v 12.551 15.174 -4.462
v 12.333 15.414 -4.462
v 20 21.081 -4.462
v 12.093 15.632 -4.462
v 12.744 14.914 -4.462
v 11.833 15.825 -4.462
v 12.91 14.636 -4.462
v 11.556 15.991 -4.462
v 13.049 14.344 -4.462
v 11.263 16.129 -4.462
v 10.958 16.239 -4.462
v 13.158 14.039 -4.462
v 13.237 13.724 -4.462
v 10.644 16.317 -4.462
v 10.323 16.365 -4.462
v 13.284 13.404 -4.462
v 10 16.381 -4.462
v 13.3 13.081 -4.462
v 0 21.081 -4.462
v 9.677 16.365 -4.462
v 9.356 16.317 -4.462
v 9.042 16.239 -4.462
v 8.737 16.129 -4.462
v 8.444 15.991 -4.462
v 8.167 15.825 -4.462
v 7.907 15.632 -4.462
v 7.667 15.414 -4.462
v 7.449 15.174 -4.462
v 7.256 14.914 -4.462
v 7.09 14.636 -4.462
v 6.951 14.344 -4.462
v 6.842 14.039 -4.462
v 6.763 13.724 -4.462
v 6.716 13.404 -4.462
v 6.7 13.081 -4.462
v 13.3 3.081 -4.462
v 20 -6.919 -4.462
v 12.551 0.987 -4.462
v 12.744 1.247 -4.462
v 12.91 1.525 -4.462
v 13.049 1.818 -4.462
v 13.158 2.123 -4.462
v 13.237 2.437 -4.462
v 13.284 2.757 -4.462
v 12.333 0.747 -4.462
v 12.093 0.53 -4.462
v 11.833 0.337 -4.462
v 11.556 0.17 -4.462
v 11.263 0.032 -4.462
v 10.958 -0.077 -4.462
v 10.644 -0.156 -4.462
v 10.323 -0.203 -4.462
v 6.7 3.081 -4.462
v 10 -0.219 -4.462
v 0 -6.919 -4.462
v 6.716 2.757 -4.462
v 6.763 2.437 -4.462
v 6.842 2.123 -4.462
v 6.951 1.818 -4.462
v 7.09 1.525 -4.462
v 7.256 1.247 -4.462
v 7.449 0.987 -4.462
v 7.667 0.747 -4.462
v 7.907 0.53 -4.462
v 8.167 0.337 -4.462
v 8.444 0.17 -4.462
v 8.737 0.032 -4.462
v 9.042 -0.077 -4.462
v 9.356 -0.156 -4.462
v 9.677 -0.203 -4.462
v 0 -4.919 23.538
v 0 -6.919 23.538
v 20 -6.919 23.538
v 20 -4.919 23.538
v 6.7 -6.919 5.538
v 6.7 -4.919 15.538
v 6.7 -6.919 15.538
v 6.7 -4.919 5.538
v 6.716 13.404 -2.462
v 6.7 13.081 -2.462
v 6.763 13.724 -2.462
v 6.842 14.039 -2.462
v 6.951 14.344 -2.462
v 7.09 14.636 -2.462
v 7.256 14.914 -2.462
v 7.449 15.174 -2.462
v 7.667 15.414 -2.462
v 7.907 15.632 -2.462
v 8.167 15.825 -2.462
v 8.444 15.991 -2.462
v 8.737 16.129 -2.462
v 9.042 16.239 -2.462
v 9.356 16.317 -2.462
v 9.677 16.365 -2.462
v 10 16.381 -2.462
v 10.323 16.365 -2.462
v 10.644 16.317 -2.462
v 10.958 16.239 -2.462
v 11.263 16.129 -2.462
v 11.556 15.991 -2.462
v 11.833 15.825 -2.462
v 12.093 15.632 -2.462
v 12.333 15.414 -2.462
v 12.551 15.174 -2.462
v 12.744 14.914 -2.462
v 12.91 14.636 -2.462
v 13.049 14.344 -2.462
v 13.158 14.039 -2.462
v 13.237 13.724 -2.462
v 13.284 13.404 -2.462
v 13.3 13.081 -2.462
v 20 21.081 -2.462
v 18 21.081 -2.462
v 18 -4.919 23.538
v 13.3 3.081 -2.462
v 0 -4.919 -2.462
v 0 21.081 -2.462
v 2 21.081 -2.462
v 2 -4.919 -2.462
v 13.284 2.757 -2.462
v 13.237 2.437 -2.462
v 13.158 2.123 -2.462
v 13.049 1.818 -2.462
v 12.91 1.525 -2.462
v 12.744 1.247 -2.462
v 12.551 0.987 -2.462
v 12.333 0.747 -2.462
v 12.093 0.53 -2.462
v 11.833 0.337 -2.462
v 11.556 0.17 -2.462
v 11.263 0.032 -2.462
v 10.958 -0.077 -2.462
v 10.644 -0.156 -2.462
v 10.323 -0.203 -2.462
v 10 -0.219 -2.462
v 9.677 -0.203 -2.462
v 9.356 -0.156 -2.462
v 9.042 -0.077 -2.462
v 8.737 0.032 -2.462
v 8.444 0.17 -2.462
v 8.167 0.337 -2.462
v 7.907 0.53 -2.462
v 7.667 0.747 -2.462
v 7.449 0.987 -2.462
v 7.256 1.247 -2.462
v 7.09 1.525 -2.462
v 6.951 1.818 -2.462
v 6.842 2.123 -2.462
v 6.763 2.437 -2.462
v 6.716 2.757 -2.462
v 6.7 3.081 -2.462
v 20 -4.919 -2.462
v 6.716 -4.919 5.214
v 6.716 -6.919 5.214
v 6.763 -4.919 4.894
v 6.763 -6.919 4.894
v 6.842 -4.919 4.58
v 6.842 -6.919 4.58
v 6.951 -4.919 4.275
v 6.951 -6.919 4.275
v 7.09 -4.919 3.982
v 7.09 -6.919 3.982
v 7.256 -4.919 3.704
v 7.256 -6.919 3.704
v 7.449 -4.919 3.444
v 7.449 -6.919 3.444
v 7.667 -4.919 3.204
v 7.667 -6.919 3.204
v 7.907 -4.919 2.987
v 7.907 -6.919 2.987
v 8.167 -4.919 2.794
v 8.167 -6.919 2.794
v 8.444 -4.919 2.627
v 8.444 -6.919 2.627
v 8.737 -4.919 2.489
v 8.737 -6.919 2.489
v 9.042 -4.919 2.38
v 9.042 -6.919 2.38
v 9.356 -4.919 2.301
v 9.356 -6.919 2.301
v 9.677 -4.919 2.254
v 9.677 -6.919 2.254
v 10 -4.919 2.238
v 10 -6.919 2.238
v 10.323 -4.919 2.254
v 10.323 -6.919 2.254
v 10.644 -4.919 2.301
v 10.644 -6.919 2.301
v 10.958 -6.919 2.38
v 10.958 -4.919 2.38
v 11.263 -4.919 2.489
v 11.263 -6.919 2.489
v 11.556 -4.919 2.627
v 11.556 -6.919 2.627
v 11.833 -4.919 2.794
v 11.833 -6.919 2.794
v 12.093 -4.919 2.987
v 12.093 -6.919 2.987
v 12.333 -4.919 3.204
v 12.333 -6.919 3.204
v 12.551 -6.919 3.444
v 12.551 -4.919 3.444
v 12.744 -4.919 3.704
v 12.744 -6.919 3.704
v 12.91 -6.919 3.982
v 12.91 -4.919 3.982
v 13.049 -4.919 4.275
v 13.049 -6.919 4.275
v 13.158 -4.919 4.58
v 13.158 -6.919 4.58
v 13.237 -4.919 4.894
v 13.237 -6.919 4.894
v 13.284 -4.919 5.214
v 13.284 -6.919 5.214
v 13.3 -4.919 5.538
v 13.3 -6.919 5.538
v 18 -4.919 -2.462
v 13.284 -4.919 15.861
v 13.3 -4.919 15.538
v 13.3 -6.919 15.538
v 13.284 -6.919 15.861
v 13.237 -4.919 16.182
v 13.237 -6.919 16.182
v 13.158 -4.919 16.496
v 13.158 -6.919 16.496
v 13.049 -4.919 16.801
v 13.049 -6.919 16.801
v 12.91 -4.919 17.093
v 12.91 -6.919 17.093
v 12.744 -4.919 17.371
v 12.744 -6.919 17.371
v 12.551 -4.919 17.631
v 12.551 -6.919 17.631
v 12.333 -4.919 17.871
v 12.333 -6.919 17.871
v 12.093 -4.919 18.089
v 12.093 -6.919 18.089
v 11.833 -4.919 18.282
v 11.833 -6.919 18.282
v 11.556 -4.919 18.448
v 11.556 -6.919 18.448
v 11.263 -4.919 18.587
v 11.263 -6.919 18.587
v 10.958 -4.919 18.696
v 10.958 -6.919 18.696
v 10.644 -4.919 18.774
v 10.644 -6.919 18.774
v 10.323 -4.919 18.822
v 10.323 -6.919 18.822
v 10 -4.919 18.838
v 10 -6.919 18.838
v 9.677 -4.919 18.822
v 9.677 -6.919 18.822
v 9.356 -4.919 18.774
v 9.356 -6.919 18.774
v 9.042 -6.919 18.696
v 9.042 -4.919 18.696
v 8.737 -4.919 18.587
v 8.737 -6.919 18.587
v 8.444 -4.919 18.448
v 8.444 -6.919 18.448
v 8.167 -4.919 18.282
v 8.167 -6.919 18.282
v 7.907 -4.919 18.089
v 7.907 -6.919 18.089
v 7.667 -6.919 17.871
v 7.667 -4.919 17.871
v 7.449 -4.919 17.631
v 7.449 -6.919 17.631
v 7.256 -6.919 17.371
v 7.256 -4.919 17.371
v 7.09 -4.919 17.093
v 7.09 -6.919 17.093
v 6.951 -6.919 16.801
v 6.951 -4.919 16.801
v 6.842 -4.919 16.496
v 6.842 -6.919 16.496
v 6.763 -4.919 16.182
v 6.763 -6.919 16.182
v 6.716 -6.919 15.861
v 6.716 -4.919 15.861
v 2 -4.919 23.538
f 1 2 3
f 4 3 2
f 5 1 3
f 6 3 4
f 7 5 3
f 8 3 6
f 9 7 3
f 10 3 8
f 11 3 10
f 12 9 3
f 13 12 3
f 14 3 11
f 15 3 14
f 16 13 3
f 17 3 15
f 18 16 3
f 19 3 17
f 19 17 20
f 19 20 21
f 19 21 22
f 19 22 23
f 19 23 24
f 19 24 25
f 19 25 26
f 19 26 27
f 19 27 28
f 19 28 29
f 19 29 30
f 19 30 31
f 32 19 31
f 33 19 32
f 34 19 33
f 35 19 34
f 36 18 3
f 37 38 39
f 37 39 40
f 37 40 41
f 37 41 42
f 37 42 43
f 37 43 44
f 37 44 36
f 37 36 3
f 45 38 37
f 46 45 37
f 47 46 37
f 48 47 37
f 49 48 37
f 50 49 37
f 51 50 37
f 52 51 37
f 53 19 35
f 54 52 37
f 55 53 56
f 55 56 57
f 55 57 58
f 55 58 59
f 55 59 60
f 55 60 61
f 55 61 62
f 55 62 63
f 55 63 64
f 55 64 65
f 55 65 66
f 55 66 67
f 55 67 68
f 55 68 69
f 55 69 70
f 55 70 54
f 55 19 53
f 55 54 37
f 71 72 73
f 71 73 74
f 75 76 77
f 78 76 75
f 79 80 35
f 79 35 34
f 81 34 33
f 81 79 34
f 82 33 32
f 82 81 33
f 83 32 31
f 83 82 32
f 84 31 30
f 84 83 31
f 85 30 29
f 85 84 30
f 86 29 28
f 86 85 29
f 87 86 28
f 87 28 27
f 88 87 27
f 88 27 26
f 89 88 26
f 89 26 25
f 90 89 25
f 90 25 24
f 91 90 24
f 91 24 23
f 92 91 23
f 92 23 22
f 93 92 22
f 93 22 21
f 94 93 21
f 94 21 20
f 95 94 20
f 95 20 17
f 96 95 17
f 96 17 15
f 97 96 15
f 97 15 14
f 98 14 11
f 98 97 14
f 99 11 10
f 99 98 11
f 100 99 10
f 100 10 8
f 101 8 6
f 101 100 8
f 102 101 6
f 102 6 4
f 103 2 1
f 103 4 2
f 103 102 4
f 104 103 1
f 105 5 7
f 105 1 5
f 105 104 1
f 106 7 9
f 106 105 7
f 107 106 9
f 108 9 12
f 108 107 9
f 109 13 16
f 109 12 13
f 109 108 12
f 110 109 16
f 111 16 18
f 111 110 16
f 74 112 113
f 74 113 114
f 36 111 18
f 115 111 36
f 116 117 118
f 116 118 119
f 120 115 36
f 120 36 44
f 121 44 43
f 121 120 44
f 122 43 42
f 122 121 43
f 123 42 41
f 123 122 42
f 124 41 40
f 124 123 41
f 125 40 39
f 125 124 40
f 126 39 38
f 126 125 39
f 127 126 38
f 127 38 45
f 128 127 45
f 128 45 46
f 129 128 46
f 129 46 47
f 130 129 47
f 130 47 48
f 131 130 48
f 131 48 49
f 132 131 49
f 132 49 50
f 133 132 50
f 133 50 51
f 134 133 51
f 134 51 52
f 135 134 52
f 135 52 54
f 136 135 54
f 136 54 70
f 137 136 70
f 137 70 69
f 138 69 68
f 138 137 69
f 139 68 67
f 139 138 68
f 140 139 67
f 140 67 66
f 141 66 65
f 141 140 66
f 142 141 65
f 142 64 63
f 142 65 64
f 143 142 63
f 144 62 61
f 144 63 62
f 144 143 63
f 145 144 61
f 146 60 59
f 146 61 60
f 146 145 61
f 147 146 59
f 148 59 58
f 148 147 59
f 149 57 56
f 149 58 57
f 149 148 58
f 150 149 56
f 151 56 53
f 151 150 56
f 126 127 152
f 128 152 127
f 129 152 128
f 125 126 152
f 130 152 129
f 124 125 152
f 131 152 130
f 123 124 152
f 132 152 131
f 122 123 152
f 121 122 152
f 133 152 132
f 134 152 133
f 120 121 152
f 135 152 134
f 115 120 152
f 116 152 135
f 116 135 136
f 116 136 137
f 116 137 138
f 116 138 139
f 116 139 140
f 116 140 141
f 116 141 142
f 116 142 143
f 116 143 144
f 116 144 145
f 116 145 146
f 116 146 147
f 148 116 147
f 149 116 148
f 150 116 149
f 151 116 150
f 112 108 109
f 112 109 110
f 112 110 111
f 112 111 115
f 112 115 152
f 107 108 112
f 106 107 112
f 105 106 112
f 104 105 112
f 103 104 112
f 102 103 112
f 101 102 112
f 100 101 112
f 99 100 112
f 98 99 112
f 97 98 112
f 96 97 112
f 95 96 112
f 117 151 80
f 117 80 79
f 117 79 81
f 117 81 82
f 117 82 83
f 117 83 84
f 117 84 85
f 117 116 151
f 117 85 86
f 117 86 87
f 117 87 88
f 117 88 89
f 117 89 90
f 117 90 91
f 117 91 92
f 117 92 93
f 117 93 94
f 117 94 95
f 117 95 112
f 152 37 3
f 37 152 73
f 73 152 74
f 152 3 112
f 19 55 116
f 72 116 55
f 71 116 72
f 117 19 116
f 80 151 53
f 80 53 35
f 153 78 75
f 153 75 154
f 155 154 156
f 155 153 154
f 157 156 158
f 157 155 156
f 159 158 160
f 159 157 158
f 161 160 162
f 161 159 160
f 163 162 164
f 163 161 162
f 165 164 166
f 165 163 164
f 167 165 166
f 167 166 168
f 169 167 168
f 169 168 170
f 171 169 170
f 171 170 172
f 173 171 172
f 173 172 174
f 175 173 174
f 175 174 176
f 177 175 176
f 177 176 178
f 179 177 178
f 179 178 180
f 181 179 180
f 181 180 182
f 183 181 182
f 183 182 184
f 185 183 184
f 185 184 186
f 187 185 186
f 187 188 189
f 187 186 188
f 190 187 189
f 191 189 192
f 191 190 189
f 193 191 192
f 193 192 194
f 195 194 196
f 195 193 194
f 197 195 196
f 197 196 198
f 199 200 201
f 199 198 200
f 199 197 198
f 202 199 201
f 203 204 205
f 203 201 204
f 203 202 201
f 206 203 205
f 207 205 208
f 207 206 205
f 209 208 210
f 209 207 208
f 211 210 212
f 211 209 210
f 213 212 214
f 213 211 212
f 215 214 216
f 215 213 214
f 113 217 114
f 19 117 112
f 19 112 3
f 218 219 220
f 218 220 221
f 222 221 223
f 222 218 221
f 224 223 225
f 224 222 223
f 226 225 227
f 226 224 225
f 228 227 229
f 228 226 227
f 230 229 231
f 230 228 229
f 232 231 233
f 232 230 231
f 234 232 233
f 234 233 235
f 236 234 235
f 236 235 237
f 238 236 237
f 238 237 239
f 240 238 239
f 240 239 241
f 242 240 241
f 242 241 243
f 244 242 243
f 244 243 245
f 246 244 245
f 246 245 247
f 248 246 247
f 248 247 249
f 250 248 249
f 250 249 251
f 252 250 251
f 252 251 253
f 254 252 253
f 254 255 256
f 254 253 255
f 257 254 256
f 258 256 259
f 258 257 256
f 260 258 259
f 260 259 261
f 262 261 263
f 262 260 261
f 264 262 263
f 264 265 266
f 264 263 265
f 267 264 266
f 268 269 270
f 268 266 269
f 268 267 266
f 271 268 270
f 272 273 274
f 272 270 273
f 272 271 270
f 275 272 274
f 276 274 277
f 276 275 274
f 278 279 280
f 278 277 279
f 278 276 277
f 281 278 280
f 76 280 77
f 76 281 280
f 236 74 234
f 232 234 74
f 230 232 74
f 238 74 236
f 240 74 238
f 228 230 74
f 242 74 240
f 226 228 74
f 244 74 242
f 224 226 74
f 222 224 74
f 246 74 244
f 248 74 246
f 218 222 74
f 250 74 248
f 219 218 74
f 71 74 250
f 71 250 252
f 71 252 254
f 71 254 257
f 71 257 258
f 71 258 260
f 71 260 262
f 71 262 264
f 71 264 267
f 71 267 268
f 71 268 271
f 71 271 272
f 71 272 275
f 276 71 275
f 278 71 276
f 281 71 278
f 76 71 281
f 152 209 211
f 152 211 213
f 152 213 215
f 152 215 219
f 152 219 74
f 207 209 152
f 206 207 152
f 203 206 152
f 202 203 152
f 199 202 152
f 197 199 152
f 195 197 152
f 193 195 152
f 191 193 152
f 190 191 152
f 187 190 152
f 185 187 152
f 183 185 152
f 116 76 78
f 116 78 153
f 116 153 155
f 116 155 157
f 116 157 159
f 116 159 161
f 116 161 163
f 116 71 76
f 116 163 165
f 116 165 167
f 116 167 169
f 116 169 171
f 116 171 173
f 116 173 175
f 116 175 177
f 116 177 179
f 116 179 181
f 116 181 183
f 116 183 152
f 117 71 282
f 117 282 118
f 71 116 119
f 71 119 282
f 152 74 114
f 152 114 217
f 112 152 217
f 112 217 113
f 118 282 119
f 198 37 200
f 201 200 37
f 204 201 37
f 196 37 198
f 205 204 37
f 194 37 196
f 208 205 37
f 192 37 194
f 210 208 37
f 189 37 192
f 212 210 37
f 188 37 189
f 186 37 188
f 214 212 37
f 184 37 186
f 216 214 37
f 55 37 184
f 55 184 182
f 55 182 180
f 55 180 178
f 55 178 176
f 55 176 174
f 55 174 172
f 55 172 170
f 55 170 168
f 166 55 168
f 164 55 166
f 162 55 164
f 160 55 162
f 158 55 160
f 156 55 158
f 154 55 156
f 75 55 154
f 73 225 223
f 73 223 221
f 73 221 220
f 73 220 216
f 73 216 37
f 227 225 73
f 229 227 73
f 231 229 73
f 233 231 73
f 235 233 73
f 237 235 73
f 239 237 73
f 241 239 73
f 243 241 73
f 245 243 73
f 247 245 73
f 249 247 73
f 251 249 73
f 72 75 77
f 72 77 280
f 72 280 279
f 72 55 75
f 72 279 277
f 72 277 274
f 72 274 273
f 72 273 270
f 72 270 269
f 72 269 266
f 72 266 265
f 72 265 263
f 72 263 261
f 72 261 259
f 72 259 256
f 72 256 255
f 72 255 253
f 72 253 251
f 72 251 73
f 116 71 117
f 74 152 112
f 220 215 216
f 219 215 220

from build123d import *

# Parameters (mm, degrees)
EXTRUDE_1_DEPTH          = 20
GUSSET_2_THICKNESS       = 2
GUSSET_3_THICKNESS       = 2
CUT_EXTRUDE_1_DEPTH      = 6
CUT_EXTRUDE_1_DEPTH_BACK = 7
CUT_EXTRUDE_2_DEPTH      = 5
CUT_EXTRUDE_2_DEPTH_BACK = 3


with BuildPart() as part:
    # 草图3 → 凸台-拉伸1 (new body)
    with BuildSketch(Plane(origin=(0, 0, 0), x_dir=(0, 0, -1), z_dir=(1, 0, 0))):
        Polygon((4.462197867, 21.080677013), (4.462197867, -6.919322987), (-23.537802133, -6.919322987), (-23.537802133, -4.919322987), (2.462197867, -4.919322987), (2.462197867, 21.080677013), align=None)
    extrude(amount=EXTRUDE_1_DEPTH)

    # 草图7 → 切除-拉伸1 (cut, two sides)
    with BuildSketch(Plane(origin=(0, -4.919322987, 0), x_dir=(1, 0, 0), z_dir=(0, 1, 0))) as cut_extrude_1_sk:
        with BuildLine():
            Line((6.7, -15.537802133), (6.7, -5.537802133))
            ThreePointArc((6.7, -5.537802133), (10, -2.237802133), (13.3, -5.537802133))
            Line((13.3, -5.537802133), (13.3, -15.537802133))
            ThreePointArc((13.3, -15.537802133), (10, -18.837802133), (6.7, -15.537802133))
        make_face()
    extrude(amount=CUT_EXTRUDE_1_DEPTH, mode=Mode.SUBTRACT)
    extrude(cut_extrude_1_sk.sketch, amount=-CUT_EXTRUDE_1_DEPTH_BACK, mode=Mode.SUBTRACT)

    # 草图8 → 切除-拉伸2 (cut, two sides)
    with BuildSketch(Plane.XY.offset(-2.462197867)) as cut_extrude_2_sk:
        with BuildLine():
            Line((6.7, 3.080677013), (6.7, 13.080677013))
            ThreePointArc((6.7, 13.080677013), (10, 16.380677013), (13.3, 13.080677013))
            Line((13.3, 13.080677013), (13.3, 3.080677013))
            ThreePointArc((13.3, 3.080677013), (10, -0.219322987), (6.7, 3.080677013))
        make_face()
    extrude(amount=CUT_EXTRUDE_2_DEPTH, mode=Mode.SUBTRACT)
    extrude(cut_extrude_2_sk.sketch, amount=-CUT_EXTRUDE_2_DEPTH_BACK, mode=Mode.SUBTRACT)


with BuildPart() as body_2:
    # Gusset 2: a gusset: a plate 2.0 thick in the corner of two members, its outline drawn in place
    gusset_2_outline = Wire([Line((20, -4.919322987, -2.462197867), (20, 21.080677013, -2.462197867)), Line((20, 21.080677013, -2.462197867), (20, -4.919322987, 23.537802133)), Line((20, -4.919322987, 23.537802133), (20, -4.919322987, -2.462197867))])
    add(extrude(Face(gusset_2_outline), amount=GUSSET_2_THICKNESS, dir=(-1, 0, 0)))


with BuildPart() as body_3:
    # Gusset 3: a gusset: a plate 2.0 thick in the corner of two members, its outline drawn in place
    gusset_3_outline = Wire([Line((0, -4.919322987, -2.462197867), (0, -4.919322987, 23.537802133)), Line((0, -4.919322987, 23.537802133), (0, 21.080677013, -2.462197867)), Line((0, 21.080677013, -2.462197867), (0, -4.919322987, -2.462197867))])
    add(extrude(Face(gusset_3_outline), amount=GUSSET_3_THICKNESS, dir=(1, 0, 0)))


solid = Compound([part.part, body_2.part, body_3.part])
